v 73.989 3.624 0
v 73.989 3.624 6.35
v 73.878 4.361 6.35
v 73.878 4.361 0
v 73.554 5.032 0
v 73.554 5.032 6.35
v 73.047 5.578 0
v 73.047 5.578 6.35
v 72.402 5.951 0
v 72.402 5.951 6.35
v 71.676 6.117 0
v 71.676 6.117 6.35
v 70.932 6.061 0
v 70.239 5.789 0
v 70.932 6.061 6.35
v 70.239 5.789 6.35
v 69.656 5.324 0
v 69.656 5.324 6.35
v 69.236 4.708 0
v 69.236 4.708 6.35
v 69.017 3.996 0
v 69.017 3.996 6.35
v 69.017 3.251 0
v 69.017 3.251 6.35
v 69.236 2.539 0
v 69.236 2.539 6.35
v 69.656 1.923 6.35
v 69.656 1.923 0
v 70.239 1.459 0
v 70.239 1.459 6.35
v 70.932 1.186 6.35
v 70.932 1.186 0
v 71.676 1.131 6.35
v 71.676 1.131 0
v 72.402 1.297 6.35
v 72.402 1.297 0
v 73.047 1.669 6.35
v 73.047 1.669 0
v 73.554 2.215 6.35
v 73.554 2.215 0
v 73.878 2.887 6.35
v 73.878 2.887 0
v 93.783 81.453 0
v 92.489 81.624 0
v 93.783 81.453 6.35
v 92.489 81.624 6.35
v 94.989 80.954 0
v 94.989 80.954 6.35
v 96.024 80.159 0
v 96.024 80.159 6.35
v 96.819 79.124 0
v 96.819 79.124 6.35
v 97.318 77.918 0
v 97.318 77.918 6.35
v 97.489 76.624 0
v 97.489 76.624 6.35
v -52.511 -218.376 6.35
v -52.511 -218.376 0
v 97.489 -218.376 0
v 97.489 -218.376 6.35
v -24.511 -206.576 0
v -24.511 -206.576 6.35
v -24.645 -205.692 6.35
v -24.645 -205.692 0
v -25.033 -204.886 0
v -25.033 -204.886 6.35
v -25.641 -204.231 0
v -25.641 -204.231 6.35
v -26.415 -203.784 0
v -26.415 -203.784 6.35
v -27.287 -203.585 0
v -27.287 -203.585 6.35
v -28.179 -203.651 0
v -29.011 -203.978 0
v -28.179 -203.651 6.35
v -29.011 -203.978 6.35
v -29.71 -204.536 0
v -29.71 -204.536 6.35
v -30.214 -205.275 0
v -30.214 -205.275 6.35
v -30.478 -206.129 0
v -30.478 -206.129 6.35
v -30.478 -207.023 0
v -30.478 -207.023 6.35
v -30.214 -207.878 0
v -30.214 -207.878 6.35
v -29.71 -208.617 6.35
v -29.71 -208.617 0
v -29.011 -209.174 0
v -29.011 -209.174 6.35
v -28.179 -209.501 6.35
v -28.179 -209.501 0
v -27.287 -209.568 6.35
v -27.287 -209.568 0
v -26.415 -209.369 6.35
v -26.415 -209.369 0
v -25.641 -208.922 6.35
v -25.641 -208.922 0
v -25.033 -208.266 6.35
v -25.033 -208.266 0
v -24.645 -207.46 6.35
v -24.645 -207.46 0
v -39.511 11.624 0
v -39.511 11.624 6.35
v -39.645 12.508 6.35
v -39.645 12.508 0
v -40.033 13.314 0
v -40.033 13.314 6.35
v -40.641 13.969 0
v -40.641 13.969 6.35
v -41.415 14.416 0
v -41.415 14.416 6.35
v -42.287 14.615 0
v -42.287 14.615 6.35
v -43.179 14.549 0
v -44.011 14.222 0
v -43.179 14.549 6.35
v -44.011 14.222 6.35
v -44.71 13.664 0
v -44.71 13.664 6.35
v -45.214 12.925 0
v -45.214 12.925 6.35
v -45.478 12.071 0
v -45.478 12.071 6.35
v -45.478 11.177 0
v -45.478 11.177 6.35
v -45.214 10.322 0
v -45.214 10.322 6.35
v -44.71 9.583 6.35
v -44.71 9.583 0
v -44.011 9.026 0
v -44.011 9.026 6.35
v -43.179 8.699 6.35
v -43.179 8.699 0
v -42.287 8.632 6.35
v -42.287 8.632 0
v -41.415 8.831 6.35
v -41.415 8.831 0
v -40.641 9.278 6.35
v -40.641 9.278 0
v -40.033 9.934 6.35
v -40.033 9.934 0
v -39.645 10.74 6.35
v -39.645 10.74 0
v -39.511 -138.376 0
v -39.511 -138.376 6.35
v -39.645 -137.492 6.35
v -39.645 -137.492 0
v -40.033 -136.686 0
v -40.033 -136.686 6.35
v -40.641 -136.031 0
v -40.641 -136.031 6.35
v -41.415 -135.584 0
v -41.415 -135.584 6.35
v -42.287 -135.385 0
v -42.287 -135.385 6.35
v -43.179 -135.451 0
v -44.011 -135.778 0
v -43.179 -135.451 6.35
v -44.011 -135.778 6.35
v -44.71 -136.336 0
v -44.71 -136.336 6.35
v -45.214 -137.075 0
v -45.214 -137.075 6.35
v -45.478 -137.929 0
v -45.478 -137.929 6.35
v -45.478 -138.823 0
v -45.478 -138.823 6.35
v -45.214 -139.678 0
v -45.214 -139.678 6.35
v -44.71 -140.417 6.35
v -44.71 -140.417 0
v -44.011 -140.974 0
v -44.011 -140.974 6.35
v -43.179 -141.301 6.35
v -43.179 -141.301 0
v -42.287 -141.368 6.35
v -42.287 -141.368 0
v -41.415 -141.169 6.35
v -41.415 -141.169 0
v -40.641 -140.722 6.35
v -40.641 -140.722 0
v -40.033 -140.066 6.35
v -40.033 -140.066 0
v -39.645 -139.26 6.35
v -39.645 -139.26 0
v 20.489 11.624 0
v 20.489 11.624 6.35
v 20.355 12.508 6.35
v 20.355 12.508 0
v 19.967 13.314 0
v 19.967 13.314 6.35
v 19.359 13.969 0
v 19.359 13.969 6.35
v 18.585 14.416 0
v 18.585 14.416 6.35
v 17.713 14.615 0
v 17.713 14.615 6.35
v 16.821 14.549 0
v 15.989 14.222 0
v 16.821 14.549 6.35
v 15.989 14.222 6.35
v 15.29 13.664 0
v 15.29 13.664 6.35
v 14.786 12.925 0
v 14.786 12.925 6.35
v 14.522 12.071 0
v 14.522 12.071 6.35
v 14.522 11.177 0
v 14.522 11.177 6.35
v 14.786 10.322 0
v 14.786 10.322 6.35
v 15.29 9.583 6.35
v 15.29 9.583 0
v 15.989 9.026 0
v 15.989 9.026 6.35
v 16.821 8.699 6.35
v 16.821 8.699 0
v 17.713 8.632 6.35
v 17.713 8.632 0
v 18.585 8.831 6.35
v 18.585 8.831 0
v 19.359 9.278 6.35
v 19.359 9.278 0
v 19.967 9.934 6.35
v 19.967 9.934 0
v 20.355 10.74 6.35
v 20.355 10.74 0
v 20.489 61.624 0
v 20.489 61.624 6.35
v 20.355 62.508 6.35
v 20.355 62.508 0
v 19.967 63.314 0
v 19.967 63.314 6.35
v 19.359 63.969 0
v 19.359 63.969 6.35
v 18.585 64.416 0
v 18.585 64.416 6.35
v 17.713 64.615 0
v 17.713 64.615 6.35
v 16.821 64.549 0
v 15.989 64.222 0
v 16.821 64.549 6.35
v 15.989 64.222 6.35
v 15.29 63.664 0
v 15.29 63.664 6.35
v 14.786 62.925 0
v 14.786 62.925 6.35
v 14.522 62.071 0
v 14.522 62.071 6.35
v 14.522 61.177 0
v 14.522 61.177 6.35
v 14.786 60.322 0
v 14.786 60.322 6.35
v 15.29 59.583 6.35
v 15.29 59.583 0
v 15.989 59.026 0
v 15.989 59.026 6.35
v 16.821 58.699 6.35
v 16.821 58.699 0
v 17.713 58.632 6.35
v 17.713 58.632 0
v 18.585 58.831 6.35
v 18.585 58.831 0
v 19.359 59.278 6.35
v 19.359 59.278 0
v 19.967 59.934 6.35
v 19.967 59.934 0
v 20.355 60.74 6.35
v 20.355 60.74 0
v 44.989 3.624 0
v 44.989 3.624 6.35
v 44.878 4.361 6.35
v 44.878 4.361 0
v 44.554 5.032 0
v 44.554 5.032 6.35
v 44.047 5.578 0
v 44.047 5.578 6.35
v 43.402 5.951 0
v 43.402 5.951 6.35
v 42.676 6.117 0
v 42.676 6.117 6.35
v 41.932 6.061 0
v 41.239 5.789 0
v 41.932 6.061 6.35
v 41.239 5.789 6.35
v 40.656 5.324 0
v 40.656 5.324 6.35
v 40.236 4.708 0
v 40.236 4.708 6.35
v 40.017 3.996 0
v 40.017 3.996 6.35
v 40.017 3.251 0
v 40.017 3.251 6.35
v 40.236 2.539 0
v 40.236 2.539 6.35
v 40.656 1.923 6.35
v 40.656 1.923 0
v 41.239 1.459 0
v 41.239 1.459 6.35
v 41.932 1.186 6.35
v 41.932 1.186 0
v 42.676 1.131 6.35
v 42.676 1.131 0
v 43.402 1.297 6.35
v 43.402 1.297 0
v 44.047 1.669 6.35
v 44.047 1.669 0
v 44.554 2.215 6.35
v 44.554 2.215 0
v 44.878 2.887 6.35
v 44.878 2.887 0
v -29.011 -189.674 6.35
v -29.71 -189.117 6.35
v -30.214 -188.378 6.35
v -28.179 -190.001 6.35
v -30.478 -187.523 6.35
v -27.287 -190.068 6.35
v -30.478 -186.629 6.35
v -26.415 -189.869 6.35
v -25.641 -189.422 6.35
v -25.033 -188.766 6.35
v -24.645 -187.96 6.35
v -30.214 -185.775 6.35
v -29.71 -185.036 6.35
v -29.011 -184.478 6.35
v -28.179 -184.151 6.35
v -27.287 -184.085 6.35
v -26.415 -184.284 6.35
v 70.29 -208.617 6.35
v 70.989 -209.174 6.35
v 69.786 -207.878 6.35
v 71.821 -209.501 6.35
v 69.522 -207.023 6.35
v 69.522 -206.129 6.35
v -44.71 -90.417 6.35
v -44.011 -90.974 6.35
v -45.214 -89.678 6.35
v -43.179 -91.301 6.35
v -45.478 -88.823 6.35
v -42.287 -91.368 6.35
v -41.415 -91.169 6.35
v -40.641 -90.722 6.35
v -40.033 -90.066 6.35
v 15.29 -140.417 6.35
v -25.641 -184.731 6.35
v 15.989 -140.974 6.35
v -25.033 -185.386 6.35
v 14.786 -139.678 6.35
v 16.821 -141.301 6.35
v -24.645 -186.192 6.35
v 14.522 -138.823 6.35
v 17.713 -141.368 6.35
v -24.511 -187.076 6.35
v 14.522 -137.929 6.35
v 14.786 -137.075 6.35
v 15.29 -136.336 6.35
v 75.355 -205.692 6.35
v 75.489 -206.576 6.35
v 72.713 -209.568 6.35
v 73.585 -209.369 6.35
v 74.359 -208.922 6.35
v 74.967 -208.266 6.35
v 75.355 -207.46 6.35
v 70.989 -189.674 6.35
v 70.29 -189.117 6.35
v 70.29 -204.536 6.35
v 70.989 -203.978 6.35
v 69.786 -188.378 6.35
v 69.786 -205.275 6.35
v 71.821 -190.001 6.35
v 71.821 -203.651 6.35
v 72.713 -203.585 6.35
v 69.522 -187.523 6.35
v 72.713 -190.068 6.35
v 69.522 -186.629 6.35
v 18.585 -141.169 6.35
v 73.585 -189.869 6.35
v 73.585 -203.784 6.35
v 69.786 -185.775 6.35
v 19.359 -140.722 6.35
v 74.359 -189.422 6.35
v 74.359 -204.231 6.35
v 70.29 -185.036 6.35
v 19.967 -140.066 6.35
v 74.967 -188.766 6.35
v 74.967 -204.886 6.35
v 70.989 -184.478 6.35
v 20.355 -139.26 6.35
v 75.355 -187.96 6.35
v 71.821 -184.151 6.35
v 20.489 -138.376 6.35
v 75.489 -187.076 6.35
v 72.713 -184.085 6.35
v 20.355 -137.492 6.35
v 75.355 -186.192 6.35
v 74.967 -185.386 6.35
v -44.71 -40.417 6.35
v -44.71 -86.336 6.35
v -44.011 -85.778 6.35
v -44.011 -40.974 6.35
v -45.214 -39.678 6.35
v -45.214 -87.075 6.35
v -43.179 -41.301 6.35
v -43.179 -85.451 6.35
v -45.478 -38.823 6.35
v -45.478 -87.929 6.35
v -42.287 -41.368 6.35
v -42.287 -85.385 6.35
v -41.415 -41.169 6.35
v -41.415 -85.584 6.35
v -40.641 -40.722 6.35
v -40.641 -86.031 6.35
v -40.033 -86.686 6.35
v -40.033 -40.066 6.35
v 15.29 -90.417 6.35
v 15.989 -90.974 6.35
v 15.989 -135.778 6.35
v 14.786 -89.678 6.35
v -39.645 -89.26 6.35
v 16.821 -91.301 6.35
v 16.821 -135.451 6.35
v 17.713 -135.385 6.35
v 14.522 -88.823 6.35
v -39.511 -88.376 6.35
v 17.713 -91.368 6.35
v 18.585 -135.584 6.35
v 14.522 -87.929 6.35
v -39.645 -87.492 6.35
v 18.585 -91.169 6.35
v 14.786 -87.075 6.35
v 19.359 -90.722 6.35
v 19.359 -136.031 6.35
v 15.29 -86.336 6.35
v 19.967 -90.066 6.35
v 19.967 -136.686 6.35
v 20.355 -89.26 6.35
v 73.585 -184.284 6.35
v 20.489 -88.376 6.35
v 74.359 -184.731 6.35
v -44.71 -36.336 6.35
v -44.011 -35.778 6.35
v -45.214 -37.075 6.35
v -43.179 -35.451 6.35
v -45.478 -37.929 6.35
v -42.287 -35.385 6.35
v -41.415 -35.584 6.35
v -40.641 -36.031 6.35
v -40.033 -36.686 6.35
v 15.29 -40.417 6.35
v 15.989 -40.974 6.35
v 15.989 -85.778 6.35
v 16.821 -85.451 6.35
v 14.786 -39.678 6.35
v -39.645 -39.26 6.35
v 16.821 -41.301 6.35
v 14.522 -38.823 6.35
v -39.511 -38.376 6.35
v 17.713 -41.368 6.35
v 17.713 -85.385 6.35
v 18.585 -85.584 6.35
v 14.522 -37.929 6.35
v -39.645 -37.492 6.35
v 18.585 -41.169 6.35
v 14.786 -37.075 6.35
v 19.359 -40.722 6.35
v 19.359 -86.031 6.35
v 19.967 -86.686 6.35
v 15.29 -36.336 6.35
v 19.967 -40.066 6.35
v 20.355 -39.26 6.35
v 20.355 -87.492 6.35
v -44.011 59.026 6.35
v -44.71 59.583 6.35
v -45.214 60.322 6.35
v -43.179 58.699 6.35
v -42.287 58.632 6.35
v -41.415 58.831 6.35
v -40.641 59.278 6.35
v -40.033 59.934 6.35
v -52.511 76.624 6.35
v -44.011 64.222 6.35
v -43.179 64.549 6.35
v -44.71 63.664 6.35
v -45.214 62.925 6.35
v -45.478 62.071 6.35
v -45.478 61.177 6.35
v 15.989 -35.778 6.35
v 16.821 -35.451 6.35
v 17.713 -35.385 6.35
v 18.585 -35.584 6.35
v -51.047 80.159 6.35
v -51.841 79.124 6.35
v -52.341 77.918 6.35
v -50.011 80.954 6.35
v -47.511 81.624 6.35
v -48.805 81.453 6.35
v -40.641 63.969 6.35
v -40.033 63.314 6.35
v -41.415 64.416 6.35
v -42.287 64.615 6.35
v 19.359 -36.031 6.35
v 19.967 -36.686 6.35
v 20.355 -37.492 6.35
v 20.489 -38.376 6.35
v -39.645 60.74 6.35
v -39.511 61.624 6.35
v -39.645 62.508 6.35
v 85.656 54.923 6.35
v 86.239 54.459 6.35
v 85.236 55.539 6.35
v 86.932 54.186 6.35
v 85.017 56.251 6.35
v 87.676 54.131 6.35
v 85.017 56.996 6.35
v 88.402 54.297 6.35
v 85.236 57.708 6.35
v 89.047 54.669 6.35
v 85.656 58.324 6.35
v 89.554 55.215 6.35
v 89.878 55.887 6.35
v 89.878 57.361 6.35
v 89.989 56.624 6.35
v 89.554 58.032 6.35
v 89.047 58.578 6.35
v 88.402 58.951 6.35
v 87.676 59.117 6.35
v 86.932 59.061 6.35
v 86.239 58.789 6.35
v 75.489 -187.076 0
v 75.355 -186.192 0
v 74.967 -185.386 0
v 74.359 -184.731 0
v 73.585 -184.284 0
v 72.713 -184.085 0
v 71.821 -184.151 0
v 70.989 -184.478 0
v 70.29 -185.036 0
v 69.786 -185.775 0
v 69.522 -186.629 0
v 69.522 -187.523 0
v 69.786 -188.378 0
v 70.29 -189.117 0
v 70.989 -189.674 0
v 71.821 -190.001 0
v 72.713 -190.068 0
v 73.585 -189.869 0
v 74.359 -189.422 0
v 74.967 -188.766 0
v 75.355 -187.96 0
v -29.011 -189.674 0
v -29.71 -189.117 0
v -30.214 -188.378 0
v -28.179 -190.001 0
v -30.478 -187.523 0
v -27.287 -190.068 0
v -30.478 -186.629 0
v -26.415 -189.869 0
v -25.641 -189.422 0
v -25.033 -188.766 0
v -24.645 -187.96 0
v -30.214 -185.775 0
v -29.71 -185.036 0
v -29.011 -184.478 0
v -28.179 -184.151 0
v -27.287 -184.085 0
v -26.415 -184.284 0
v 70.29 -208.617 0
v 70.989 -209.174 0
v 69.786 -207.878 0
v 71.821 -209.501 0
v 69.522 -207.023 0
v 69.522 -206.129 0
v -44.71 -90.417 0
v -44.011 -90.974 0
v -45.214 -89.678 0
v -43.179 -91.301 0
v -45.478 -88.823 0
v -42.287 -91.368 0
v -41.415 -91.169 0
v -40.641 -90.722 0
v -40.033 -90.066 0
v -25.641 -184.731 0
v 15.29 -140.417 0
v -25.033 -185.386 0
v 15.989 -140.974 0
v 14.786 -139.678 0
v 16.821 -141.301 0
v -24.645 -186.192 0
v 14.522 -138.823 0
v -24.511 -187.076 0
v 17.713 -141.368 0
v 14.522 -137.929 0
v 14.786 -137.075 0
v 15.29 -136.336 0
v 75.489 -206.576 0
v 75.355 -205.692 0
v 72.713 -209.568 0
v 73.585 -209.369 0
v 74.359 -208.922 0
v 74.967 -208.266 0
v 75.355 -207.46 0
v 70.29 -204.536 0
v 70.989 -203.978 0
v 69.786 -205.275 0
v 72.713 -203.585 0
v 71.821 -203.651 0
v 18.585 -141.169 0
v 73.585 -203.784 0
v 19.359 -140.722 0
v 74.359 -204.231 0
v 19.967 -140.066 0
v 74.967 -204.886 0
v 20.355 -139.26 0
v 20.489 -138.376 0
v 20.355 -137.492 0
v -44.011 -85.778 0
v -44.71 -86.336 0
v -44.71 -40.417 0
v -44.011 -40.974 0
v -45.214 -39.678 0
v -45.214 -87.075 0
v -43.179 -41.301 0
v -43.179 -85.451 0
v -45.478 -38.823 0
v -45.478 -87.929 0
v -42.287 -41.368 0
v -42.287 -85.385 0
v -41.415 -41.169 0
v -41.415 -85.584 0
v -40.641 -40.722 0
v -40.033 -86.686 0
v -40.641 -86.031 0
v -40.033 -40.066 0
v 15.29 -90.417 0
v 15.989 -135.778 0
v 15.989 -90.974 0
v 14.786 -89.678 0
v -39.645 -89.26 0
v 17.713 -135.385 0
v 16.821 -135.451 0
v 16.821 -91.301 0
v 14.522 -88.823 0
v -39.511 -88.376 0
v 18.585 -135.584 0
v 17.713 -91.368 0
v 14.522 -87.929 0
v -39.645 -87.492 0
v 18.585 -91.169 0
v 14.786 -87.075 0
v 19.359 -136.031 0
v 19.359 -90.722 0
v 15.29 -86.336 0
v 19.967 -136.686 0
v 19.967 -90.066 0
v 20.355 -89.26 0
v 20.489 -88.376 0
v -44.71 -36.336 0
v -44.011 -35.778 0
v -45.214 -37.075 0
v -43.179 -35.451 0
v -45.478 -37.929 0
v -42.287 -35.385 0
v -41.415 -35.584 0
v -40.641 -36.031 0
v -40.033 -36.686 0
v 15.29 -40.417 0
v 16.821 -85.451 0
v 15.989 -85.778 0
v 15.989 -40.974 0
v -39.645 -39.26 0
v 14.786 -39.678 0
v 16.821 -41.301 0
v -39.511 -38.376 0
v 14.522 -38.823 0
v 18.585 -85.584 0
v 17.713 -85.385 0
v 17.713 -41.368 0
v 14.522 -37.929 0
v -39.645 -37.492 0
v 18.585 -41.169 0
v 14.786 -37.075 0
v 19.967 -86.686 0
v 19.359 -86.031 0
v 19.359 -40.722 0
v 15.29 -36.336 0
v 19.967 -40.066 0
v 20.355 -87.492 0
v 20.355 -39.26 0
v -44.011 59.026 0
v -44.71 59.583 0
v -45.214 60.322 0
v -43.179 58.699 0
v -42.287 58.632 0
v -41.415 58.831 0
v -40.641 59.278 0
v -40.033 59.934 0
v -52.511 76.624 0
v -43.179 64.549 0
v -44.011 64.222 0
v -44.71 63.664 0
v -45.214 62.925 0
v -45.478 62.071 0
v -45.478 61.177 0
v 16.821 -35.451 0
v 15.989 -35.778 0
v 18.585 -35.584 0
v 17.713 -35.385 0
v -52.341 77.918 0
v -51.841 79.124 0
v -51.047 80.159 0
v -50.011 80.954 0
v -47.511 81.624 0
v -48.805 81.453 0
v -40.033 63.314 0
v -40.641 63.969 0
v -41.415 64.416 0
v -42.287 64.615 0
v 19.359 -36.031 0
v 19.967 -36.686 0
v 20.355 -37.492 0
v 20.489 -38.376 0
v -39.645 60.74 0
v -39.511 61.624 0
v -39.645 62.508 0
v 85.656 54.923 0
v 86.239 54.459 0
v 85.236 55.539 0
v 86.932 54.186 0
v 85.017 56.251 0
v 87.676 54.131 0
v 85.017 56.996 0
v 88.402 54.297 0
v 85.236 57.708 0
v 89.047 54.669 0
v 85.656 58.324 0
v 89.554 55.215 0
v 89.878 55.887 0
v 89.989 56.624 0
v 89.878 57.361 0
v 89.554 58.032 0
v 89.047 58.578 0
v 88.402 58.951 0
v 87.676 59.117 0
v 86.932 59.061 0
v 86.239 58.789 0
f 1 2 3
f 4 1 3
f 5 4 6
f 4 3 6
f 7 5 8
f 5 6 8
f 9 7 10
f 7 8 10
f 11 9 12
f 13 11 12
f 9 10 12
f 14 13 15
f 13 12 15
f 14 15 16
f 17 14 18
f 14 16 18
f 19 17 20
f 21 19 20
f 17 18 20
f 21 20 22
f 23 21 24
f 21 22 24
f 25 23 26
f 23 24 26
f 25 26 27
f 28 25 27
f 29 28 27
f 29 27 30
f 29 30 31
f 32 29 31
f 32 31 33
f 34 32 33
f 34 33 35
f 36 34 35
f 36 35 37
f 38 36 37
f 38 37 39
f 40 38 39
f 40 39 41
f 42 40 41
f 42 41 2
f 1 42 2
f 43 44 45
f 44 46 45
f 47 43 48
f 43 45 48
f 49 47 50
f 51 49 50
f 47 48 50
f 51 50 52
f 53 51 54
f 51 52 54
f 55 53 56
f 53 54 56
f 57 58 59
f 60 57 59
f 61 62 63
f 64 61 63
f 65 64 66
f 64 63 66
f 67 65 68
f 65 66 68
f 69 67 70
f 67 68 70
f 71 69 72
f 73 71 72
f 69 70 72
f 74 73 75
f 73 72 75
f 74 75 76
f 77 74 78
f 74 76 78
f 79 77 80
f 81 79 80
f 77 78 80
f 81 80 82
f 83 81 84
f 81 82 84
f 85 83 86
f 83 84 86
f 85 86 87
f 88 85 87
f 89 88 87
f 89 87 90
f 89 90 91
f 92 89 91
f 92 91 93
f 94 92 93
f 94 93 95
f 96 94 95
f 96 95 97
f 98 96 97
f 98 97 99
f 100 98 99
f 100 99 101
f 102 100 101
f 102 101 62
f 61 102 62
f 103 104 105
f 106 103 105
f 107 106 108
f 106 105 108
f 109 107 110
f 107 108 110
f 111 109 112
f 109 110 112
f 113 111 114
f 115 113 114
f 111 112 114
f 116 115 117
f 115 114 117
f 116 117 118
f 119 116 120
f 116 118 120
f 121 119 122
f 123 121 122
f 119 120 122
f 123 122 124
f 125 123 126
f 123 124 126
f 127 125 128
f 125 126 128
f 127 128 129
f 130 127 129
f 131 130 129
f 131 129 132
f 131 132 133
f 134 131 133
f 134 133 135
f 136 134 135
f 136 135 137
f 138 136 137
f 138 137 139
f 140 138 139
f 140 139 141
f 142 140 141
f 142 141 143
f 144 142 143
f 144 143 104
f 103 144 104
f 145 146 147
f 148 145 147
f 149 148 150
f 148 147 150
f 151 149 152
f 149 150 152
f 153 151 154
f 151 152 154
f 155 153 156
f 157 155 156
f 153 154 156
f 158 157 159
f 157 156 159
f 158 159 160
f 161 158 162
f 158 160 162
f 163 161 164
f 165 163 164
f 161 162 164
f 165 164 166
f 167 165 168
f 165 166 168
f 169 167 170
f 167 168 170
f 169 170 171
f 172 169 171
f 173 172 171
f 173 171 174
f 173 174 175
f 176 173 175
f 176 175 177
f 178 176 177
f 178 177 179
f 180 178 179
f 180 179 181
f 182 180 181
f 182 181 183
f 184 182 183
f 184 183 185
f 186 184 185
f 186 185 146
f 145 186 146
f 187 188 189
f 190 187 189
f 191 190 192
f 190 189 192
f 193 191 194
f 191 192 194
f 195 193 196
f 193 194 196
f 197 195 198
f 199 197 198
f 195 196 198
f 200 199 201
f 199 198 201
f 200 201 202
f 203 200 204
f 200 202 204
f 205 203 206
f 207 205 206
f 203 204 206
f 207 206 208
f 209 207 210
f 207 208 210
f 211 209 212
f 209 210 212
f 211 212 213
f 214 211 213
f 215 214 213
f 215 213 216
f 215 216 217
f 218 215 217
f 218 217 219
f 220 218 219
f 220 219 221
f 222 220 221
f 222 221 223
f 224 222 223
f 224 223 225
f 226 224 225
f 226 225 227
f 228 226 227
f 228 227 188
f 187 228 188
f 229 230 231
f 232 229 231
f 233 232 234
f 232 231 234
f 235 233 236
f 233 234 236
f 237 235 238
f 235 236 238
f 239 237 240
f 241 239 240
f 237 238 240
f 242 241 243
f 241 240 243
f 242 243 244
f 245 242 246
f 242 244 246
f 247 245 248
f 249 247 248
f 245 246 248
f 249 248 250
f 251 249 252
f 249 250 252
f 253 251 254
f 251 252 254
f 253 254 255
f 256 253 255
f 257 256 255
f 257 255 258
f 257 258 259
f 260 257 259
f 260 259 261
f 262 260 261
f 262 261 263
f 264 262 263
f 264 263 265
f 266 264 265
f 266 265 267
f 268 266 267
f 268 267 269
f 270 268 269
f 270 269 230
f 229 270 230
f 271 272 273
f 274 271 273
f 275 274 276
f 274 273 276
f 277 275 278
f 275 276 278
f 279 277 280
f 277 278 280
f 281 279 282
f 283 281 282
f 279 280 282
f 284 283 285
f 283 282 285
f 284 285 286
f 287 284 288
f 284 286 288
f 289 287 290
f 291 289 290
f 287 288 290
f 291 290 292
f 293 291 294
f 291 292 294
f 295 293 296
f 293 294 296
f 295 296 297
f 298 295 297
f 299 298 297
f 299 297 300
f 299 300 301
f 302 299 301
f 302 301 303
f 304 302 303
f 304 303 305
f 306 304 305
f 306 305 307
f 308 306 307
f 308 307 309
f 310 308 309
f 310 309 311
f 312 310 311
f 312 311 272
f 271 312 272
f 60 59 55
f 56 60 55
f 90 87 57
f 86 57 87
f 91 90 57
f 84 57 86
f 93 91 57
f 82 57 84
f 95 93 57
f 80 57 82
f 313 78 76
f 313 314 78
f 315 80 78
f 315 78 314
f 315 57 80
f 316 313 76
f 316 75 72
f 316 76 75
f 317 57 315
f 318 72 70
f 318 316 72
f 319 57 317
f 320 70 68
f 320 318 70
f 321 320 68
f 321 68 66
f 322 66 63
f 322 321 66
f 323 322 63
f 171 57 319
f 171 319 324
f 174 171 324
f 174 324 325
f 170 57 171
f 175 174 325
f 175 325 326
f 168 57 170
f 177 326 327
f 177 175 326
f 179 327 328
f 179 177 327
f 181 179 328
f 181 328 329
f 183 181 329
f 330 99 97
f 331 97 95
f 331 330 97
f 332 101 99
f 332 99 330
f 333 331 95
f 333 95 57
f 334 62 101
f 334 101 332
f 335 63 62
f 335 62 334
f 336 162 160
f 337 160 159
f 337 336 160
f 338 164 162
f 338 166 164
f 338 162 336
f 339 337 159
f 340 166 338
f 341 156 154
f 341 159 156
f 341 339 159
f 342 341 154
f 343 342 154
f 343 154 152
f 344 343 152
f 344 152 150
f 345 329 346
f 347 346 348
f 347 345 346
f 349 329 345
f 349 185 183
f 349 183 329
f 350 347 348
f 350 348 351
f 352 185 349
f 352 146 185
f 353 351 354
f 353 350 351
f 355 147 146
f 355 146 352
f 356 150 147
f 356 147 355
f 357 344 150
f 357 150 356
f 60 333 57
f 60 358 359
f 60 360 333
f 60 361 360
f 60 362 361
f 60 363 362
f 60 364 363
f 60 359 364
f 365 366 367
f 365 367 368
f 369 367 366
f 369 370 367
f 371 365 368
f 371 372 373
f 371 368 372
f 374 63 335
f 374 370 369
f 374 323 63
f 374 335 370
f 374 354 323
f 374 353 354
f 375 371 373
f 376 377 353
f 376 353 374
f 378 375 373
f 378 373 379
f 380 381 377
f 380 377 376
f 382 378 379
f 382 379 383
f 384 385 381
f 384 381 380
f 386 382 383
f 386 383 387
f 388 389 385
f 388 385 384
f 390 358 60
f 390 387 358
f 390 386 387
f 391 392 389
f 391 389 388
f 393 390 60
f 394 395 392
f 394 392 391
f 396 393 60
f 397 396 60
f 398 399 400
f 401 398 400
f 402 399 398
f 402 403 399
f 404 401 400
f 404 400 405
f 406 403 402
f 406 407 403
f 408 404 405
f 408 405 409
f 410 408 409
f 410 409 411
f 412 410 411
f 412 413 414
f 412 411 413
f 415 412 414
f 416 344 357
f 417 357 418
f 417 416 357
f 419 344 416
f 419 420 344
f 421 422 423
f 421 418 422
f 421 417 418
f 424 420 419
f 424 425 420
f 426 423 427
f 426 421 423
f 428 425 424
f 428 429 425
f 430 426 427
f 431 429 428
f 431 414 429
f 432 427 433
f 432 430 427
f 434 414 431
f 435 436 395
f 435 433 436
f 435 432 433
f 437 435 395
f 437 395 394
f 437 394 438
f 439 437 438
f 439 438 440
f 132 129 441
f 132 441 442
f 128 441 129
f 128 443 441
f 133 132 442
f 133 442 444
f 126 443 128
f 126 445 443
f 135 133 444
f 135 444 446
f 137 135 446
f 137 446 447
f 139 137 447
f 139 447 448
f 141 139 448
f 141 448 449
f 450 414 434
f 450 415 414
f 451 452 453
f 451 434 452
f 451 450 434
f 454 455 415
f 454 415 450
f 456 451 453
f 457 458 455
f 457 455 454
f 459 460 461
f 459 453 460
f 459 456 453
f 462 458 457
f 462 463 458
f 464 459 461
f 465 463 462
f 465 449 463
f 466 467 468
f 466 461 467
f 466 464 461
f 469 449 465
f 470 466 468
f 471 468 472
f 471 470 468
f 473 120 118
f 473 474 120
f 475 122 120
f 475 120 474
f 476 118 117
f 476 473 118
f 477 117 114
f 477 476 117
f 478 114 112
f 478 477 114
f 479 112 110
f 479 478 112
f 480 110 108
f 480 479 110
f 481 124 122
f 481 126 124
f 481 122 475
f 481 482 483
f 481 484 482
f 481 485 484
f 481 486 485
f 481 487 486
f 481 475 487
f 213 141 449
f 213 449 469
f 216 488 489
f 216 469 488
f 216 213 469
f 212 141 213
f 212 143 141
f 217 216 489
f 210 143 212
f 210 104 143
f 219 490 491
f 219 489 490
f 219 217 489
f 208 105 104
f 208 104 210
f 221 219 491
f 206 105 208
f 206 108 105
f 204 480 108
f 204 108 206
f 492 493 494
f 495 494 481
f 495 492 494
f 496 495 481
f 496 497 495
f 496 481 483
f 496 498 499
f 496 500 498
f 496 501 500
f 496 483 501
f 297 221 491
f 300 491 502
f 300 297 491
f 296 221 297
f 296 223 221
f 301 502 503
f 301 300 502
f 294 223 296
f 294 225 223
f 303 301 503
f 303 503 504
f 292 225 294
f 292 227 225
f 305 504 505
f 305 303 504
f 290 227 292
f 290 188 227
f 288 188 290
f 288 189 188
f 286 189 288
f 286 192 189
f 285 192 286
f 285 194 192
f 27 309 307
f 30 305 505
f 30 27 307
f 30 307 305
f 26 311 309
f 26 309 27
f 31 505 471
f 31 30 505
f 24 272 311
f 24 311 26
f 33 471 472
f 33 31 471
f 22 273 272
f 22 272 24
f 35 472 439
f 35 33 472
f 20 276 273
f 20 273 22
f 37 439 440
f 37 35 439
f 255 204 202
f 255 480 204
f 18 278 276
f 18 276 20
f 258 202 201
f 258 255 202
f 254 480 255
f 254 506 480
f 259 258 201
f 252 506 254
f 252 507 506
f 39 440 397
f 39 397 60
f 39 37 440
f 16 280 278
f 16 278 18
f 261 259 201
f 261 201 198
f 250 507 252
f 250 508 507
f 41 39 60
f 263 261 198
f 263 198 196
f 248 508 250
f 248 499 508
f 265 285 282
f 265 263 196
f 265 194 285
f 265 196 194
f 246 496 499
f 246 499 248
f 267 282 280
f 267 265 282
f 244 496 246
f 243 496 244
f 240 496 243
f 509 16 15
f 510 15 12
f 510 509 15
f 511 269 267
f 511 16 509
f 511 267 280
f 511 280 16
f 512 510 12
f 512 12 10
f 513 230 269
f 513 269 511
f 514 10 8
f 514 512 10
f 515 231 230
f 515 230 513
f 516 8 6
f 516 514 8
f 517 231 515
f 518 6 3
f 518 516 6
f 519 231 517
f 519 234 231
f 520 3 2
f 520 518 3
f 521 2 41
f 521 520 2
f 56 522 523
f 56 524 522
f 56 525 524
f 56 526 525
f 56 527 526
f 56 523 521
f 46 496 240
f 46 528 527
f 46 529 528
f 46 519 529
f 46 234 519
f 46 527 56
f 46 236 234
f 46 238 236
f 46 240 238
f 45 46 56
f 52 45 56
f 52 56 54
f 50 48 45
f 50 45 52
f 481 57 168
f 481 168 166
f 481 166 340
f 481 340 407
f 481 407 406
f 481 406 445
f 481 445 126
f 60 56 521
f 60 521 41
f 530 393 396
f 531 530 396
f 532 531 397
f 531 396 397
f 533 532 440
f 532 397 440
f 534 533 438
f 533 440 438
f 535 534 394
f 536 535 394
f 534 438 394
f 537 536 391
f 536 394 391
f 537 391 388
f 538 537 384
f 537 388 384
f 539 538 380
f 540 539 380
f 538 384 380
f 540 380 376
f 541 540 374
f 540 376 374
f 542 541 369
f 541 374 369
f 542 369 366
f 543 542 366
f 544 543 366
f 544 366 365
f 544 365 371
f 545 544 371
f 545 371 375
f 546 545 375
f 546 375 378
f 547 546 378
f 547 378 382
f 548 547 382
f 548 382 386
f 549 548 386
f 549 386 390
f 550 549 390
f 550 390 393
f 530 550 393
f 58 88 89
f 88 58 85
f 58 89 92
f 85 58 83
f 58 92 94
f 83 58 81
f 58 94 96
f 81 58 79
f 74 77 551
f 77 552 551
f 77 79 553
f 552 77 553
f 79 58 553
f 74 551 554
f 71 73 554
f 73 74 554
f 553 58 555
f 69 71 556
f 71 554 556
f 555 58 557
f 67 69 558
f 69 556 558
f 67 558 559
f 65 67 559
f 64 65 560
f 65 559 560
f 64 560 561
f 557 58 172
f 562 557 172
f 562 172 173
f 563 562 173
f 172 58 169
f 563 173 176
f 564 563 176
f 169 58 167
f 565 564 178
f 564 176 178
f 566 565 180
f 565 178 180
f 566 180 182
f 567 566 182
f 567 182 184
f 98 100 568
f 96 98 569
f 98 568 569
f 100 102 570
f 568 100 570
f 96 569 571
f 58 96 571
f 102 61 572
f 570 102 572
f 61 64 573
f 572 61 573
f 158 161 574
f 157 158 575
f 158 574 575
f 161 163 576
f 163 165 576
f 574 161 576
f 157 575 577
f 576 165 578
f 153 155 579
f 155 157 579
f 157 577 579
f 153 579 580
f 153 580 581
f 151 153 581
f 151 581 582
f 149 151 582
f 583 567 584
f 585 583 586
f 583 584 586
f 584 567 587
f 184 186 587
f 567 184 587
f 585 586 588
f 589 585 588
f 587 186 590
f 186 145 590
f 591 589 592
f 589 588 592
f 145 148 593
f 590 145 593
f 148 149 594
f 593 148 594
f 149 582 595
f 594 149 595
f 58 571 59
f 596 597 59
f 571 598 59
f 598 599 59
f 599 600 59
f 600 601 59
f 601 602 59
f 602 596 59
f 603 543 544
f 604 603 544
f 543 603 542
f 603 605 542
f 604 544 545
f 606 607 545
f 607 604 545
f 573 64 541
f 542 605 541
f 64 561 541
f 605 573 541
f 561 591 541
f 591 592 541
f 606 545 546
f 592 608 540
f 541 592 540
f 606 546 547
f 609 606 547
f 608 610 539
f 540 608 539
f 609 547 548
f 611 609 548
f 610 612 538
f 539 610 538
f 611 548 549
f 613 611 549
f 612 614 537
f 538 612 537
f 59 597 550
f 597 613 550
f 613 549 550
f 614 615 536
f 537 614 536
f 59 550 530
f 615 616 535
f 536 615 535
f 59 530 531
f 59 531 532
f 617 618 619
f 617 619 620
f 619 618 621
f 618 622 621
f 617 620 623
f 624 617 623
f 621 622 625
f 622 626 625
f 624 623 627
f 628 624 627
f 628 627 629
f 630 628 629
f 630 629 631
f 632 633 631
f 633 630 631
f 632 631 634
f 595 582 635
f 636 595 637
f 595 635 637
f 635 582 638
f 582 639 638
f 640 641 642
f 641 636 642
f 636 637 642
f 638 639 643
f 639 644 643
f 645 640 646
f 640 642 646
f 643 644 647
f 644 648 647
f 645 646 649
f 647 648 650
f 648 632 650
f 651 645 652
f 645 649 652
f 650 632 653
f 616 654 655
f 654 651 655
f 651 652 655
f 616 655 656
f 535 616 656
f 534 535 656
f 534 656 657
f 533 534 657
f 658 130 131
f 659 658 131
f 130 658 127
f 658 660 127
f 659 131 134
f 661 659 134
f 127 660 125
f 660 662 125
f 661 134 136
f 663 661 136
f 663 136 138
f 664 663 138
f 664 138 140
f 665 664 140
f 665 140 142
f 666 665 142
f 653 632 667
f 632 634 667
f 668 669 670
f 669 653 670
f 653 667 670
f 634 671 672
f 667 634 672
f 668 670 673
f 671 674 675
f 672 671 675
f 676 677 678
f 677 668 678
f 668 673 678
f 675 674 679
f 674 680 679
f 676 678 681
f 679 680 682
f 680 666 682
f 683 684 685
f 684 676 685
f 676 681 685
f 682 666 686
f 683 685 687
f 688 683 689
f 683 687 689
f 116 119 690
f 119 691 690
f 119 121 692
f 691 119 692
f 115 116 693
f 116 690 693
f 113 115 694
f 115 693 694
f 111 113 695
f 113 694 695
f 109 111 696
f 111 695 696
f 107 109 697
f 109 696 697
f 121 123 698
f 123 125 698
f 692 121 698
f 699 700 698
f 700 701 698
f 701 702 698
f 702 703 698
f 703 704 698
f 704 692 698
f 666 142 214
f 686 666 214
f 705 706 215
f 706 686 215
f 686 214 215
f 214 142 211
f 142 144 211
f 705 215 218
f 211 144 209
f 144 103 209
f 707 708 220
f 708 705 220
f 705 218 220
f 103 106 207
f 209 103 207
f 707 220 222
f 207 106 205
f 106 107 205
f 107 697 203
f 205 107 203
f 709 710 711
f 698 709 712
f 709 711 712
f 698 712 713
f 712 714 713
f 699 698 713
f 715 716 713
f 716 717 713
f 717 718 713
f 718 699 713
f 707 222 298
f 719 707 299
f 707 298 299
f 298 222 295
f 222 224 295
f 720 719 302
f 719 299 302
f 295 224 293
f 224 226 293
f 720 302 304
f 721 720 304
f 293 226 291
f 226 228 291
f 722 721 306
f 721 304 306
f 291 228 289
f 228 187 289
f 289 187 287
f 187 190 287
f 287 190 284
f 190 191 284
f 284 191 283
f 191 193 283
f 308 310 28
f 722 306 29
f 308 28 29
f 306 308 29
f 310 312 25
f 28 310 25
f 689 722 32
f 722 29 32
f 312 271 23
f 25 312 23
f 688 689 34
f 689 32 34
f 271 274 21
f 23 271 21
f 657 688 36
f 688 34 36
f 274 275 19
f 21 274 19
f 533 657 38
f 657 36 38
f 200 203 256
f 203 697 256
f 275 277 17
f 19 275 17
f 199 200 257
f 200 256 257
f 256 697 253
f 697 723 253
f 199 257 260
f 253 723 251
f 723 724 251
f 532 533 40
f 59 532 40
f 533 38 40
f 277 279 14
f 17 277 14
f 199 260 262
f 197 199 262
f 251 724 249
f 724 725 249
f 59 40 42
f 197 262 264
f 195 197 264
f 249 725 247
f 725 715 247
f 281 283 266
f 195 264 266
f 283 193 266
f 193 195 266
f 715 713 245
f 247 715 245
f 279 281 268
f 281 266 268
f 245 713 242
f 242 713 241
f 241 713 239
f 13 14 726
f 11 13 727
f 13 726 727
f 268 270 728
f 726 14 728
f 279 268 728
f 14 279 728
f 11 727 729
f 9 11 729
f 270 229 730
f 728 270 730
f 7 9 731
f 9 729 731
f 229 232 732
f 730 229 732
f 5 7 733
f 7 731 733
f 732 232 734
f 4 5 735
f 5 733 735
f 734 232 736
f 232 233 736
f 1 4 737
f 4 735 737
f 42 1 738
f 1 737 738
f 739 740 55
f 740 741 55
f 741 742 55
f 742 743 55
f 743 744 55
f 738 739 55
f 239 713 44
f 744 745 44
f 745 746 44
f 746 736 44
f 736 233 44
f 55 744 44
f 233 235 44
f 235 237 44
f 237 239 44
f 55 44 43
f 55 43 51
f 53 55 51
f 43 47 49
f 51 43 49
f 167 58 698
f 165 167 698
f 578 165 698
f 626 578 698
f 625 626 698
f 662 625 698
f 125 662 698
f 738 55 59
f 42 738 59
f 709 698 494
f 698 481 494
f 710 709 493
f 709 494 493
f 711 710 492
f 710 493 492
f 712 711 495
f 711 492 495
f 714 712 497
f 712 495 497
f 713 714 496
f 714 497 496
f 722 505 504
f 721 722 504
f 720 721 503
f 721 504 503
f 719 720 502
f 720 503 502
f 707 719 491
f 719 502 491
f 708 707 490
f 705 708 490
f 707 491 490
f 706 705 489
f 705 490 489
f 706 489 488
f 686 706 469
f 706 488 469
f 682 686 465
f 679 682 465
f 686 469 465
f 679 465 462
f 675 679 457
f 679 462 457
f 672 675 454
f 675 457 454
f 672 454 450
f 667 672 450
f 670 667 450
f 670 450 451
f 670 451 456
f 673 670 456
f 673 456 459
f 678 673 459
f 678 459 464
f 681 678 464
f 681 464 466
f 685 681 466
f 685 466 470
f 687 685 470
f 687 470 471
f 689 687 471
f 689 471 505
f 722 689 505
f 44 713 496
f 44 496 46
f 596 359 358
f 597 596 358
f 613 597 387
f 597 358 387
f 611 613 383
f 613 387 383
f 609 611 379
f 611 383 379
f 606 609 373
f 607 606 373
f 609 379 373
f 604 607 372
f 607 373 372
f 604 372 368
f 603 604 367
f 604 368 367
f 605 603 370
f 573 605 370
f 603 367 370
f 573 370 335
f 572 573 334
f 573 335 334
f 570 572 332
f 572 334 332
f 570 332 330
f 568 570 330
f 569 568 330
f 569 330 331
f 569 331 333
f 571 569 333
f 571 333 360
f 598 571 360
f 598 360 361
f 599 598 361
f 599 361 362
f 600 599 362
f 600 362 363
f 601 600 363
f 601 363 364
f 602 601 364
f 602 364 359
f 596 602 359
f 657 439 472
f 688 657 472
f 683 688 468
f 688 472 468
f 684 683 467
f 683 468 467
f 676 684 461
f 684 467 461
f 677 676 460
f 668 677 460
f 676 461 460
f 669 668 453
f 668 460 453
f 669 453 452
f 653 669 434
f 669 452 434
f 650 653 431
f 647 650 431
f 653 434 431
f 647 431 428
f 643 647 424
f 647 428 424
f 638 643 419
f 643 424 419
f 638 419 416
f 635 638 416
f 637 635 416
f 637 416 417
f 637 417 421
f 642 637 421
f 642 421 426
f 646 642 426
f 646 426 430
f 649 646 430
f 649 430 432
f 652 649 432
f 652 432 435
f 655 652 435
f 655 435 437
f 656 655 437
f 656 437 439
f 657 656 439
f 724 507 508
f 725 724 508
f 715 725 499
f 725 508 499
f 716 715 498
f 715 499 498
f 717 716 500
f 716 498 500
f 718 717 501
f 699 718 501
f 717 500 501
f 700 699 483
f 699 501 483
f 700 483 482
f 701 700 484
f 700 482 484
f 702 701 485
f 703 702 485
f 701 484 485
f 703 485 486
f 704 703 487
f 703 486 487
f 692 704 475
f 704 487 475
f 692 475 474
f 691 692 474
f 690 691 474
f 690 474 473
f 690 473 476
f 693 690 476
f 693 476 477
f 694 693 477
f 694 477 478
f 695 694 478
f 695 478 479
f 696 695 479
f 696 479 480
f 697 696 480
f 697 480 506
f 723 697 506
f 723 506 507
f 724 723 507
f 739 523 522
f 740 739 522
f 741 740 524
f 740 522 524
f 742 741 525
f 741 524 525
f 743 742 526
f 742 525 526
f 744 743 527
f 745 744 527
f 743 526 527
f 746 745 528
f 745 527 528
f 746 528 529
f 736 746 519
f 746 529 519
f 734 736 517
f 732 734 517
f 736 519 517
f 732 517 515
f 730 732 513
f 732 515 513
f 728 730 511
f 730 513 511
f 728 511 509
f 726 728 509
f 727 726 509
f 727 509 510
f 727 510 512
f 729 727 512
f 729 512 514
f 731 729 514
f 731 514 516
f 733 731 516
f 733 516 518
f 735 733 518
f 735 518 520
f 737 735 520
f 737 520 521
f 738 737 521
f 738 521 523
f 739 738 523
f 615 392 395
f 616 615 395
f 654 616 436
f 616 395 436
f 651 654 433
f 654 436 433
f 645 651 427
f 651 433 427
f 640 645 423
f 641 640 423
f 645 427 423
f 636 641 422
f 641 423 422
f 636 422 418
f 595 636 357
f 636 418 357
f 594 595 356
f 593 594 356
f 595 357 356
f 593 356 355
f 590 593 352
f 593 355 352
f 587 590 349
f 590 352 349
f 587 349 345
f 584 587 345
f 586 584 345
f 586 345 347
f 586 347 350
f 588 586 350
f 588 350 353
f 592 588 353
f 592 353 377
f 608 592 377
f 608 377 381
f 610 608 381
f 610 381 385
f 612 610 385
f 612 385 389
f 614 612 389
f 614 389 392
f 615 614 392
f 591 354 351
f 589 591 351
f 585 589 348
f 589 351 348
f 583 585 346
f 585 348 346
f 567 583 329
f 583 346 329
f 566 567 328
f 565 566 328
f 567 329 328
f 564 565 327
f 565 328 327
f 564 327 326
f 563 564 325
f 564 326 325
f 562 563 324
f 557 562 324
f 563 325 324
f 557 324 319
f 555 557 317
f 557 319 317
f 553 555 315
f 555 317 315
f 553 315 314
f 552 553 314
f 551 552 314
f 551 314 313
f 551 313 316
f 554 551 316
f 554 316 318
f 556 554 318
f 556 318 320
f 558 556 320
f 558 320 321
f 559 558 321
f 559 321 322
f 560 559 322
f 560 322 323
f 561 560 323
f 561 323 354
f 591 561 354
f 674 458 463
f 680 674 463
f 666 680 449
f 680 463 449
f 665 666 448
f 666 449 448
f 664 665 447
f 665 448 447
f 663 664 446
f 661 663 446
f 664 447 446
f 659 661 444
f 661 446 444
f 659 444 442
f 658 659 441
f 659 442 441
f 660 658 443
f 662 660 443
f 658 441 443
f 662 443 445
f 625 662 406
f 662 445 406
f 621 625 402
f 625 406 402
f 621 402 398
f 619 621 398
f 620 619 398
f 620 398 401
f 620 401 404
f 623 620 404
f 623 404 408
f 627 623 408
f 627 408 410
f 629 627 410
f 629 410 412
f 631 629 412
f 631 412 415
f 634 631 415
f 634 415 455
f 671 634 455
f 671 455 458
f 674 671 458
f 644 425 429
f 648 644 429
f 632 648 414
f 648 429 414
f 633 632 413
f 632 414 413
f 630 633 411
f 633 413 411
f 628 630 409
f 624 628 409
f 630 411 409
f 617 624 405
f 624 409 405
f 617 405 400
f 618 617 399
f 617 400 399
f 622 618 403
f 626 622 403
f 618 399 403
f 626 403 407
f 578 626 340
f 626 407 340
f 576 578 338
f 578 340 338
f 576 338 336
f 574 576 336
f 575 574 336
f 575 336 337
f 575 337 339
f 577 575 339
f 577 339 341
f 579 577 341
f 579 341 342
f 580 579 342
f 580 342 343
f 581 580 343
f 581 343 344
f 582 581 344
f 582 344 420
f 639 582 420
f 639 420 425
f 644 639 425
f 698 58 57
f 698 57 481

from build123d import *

# Parameters (mm, degrees)
SKETCH1_W           = 150
SKETCH1_H           = 300
BOSS_EXTRUDE1_DEPTH = 6.35
SKETCH2_R           = 3
CUT_EXTRUDE1_DEPTH  = 240.233244061
SKETCH3_R           = 2.5
SKETCH3_R_2         = 3
CUT_EXTRUDE2_DEPTH  = 240.233244061
FILLET1_R           = 5


with BuildPart() as part:
    # Sketch1 → Boss-Extrude1 (new body)
    with BuildSketch(Plane.XY):
        with Locations((22.488704023, -68.37622387)):
            Rectangle(SKETCH1_W, SKETCH1_H)
    extrude(amount=BOSS_EXTRUDE1_DEPTH)

    # Sketch2 → Cut-Extrude1 (cut, through all)
    with BuildSketch(Plane.XY.offset(6.35)):
        with Locations((-27.511295977, -206.57622387)):
            Circle(SKETCH2_R)
        with Locations((-27.511295977, -187.07622387)):
            Circle(SKETCH2_R)
        with Locations((72.488704023, -206.57622387)):
            Circle(SKETCH2_R)
        with Locations((72.488704023, -187.07622387)):
            Circle(SKETCH2_R)
    extrude(amount=-CUT_EXTRUDE1_DEPTH, mode=Mode.SUBTRACT)

    # Sketch3 → Cut-Extrude2 (cut, through all)
    with BuildSketch(Plane.XY.offset(6.35)):
        with Locations((42.488704023, 3.62377613)):
            Circle(SKETCH3_R)
        with Locations((71.488704023, 3.62377613)):
            Circle(SKETCH3_R)
        with Locations((87.488704023, 56.62377613)):
            Circle(SKETCH3_R)
        with Locations((-42.511295977, -38.37622387)):
            Circle(SKETCH3_R_2)
        with Locations((17.488704023, -38.37622387)):
            Circle(SKETCH3_R_2)
        with Locations((-42.511295977, -138.37622387)):
            Circle(SKETCH3_R_2)
        with Locations((17.488704023, -138.37622387)):
            Circle(SKETCH3_R_2)
        with Locations((-42.511295977, -88.37622387)):
            Circle(SKETCH3_R_2)
        with Locations((17.488704023, -88.37622387)):
            Circle(SKETCH3_R_2)
        with Locations((-42.511295977, 11.62377613)):
            Circle(SKETCH3_R_2)
        with Locations((17.488704023, 11.62377613)):
            Circle(SKETCH3_R_2)
        with Locations((-42.511295977, 61.62377613)):
            Circle(SKETCH3_R_2)
        with Locations((17.488704023, 61.62377613)):
            Circle(SKETCH3_R_2)
    extrude(amount=-CUT_EXTRUDE2_DEPTH, mode=Mode.SUBTRACT)

    # Fillet1
    fillet1_edges = [part.edges().sort_by_distance(p)[0] for p in [
        (-52.511295977, 81.62377613, 3.175),
        (97.488704023, 81.62377613, 3.175),
    ]]
    fillet(fillet1_edges, radius=FILLET1_R)


solid = part.part
